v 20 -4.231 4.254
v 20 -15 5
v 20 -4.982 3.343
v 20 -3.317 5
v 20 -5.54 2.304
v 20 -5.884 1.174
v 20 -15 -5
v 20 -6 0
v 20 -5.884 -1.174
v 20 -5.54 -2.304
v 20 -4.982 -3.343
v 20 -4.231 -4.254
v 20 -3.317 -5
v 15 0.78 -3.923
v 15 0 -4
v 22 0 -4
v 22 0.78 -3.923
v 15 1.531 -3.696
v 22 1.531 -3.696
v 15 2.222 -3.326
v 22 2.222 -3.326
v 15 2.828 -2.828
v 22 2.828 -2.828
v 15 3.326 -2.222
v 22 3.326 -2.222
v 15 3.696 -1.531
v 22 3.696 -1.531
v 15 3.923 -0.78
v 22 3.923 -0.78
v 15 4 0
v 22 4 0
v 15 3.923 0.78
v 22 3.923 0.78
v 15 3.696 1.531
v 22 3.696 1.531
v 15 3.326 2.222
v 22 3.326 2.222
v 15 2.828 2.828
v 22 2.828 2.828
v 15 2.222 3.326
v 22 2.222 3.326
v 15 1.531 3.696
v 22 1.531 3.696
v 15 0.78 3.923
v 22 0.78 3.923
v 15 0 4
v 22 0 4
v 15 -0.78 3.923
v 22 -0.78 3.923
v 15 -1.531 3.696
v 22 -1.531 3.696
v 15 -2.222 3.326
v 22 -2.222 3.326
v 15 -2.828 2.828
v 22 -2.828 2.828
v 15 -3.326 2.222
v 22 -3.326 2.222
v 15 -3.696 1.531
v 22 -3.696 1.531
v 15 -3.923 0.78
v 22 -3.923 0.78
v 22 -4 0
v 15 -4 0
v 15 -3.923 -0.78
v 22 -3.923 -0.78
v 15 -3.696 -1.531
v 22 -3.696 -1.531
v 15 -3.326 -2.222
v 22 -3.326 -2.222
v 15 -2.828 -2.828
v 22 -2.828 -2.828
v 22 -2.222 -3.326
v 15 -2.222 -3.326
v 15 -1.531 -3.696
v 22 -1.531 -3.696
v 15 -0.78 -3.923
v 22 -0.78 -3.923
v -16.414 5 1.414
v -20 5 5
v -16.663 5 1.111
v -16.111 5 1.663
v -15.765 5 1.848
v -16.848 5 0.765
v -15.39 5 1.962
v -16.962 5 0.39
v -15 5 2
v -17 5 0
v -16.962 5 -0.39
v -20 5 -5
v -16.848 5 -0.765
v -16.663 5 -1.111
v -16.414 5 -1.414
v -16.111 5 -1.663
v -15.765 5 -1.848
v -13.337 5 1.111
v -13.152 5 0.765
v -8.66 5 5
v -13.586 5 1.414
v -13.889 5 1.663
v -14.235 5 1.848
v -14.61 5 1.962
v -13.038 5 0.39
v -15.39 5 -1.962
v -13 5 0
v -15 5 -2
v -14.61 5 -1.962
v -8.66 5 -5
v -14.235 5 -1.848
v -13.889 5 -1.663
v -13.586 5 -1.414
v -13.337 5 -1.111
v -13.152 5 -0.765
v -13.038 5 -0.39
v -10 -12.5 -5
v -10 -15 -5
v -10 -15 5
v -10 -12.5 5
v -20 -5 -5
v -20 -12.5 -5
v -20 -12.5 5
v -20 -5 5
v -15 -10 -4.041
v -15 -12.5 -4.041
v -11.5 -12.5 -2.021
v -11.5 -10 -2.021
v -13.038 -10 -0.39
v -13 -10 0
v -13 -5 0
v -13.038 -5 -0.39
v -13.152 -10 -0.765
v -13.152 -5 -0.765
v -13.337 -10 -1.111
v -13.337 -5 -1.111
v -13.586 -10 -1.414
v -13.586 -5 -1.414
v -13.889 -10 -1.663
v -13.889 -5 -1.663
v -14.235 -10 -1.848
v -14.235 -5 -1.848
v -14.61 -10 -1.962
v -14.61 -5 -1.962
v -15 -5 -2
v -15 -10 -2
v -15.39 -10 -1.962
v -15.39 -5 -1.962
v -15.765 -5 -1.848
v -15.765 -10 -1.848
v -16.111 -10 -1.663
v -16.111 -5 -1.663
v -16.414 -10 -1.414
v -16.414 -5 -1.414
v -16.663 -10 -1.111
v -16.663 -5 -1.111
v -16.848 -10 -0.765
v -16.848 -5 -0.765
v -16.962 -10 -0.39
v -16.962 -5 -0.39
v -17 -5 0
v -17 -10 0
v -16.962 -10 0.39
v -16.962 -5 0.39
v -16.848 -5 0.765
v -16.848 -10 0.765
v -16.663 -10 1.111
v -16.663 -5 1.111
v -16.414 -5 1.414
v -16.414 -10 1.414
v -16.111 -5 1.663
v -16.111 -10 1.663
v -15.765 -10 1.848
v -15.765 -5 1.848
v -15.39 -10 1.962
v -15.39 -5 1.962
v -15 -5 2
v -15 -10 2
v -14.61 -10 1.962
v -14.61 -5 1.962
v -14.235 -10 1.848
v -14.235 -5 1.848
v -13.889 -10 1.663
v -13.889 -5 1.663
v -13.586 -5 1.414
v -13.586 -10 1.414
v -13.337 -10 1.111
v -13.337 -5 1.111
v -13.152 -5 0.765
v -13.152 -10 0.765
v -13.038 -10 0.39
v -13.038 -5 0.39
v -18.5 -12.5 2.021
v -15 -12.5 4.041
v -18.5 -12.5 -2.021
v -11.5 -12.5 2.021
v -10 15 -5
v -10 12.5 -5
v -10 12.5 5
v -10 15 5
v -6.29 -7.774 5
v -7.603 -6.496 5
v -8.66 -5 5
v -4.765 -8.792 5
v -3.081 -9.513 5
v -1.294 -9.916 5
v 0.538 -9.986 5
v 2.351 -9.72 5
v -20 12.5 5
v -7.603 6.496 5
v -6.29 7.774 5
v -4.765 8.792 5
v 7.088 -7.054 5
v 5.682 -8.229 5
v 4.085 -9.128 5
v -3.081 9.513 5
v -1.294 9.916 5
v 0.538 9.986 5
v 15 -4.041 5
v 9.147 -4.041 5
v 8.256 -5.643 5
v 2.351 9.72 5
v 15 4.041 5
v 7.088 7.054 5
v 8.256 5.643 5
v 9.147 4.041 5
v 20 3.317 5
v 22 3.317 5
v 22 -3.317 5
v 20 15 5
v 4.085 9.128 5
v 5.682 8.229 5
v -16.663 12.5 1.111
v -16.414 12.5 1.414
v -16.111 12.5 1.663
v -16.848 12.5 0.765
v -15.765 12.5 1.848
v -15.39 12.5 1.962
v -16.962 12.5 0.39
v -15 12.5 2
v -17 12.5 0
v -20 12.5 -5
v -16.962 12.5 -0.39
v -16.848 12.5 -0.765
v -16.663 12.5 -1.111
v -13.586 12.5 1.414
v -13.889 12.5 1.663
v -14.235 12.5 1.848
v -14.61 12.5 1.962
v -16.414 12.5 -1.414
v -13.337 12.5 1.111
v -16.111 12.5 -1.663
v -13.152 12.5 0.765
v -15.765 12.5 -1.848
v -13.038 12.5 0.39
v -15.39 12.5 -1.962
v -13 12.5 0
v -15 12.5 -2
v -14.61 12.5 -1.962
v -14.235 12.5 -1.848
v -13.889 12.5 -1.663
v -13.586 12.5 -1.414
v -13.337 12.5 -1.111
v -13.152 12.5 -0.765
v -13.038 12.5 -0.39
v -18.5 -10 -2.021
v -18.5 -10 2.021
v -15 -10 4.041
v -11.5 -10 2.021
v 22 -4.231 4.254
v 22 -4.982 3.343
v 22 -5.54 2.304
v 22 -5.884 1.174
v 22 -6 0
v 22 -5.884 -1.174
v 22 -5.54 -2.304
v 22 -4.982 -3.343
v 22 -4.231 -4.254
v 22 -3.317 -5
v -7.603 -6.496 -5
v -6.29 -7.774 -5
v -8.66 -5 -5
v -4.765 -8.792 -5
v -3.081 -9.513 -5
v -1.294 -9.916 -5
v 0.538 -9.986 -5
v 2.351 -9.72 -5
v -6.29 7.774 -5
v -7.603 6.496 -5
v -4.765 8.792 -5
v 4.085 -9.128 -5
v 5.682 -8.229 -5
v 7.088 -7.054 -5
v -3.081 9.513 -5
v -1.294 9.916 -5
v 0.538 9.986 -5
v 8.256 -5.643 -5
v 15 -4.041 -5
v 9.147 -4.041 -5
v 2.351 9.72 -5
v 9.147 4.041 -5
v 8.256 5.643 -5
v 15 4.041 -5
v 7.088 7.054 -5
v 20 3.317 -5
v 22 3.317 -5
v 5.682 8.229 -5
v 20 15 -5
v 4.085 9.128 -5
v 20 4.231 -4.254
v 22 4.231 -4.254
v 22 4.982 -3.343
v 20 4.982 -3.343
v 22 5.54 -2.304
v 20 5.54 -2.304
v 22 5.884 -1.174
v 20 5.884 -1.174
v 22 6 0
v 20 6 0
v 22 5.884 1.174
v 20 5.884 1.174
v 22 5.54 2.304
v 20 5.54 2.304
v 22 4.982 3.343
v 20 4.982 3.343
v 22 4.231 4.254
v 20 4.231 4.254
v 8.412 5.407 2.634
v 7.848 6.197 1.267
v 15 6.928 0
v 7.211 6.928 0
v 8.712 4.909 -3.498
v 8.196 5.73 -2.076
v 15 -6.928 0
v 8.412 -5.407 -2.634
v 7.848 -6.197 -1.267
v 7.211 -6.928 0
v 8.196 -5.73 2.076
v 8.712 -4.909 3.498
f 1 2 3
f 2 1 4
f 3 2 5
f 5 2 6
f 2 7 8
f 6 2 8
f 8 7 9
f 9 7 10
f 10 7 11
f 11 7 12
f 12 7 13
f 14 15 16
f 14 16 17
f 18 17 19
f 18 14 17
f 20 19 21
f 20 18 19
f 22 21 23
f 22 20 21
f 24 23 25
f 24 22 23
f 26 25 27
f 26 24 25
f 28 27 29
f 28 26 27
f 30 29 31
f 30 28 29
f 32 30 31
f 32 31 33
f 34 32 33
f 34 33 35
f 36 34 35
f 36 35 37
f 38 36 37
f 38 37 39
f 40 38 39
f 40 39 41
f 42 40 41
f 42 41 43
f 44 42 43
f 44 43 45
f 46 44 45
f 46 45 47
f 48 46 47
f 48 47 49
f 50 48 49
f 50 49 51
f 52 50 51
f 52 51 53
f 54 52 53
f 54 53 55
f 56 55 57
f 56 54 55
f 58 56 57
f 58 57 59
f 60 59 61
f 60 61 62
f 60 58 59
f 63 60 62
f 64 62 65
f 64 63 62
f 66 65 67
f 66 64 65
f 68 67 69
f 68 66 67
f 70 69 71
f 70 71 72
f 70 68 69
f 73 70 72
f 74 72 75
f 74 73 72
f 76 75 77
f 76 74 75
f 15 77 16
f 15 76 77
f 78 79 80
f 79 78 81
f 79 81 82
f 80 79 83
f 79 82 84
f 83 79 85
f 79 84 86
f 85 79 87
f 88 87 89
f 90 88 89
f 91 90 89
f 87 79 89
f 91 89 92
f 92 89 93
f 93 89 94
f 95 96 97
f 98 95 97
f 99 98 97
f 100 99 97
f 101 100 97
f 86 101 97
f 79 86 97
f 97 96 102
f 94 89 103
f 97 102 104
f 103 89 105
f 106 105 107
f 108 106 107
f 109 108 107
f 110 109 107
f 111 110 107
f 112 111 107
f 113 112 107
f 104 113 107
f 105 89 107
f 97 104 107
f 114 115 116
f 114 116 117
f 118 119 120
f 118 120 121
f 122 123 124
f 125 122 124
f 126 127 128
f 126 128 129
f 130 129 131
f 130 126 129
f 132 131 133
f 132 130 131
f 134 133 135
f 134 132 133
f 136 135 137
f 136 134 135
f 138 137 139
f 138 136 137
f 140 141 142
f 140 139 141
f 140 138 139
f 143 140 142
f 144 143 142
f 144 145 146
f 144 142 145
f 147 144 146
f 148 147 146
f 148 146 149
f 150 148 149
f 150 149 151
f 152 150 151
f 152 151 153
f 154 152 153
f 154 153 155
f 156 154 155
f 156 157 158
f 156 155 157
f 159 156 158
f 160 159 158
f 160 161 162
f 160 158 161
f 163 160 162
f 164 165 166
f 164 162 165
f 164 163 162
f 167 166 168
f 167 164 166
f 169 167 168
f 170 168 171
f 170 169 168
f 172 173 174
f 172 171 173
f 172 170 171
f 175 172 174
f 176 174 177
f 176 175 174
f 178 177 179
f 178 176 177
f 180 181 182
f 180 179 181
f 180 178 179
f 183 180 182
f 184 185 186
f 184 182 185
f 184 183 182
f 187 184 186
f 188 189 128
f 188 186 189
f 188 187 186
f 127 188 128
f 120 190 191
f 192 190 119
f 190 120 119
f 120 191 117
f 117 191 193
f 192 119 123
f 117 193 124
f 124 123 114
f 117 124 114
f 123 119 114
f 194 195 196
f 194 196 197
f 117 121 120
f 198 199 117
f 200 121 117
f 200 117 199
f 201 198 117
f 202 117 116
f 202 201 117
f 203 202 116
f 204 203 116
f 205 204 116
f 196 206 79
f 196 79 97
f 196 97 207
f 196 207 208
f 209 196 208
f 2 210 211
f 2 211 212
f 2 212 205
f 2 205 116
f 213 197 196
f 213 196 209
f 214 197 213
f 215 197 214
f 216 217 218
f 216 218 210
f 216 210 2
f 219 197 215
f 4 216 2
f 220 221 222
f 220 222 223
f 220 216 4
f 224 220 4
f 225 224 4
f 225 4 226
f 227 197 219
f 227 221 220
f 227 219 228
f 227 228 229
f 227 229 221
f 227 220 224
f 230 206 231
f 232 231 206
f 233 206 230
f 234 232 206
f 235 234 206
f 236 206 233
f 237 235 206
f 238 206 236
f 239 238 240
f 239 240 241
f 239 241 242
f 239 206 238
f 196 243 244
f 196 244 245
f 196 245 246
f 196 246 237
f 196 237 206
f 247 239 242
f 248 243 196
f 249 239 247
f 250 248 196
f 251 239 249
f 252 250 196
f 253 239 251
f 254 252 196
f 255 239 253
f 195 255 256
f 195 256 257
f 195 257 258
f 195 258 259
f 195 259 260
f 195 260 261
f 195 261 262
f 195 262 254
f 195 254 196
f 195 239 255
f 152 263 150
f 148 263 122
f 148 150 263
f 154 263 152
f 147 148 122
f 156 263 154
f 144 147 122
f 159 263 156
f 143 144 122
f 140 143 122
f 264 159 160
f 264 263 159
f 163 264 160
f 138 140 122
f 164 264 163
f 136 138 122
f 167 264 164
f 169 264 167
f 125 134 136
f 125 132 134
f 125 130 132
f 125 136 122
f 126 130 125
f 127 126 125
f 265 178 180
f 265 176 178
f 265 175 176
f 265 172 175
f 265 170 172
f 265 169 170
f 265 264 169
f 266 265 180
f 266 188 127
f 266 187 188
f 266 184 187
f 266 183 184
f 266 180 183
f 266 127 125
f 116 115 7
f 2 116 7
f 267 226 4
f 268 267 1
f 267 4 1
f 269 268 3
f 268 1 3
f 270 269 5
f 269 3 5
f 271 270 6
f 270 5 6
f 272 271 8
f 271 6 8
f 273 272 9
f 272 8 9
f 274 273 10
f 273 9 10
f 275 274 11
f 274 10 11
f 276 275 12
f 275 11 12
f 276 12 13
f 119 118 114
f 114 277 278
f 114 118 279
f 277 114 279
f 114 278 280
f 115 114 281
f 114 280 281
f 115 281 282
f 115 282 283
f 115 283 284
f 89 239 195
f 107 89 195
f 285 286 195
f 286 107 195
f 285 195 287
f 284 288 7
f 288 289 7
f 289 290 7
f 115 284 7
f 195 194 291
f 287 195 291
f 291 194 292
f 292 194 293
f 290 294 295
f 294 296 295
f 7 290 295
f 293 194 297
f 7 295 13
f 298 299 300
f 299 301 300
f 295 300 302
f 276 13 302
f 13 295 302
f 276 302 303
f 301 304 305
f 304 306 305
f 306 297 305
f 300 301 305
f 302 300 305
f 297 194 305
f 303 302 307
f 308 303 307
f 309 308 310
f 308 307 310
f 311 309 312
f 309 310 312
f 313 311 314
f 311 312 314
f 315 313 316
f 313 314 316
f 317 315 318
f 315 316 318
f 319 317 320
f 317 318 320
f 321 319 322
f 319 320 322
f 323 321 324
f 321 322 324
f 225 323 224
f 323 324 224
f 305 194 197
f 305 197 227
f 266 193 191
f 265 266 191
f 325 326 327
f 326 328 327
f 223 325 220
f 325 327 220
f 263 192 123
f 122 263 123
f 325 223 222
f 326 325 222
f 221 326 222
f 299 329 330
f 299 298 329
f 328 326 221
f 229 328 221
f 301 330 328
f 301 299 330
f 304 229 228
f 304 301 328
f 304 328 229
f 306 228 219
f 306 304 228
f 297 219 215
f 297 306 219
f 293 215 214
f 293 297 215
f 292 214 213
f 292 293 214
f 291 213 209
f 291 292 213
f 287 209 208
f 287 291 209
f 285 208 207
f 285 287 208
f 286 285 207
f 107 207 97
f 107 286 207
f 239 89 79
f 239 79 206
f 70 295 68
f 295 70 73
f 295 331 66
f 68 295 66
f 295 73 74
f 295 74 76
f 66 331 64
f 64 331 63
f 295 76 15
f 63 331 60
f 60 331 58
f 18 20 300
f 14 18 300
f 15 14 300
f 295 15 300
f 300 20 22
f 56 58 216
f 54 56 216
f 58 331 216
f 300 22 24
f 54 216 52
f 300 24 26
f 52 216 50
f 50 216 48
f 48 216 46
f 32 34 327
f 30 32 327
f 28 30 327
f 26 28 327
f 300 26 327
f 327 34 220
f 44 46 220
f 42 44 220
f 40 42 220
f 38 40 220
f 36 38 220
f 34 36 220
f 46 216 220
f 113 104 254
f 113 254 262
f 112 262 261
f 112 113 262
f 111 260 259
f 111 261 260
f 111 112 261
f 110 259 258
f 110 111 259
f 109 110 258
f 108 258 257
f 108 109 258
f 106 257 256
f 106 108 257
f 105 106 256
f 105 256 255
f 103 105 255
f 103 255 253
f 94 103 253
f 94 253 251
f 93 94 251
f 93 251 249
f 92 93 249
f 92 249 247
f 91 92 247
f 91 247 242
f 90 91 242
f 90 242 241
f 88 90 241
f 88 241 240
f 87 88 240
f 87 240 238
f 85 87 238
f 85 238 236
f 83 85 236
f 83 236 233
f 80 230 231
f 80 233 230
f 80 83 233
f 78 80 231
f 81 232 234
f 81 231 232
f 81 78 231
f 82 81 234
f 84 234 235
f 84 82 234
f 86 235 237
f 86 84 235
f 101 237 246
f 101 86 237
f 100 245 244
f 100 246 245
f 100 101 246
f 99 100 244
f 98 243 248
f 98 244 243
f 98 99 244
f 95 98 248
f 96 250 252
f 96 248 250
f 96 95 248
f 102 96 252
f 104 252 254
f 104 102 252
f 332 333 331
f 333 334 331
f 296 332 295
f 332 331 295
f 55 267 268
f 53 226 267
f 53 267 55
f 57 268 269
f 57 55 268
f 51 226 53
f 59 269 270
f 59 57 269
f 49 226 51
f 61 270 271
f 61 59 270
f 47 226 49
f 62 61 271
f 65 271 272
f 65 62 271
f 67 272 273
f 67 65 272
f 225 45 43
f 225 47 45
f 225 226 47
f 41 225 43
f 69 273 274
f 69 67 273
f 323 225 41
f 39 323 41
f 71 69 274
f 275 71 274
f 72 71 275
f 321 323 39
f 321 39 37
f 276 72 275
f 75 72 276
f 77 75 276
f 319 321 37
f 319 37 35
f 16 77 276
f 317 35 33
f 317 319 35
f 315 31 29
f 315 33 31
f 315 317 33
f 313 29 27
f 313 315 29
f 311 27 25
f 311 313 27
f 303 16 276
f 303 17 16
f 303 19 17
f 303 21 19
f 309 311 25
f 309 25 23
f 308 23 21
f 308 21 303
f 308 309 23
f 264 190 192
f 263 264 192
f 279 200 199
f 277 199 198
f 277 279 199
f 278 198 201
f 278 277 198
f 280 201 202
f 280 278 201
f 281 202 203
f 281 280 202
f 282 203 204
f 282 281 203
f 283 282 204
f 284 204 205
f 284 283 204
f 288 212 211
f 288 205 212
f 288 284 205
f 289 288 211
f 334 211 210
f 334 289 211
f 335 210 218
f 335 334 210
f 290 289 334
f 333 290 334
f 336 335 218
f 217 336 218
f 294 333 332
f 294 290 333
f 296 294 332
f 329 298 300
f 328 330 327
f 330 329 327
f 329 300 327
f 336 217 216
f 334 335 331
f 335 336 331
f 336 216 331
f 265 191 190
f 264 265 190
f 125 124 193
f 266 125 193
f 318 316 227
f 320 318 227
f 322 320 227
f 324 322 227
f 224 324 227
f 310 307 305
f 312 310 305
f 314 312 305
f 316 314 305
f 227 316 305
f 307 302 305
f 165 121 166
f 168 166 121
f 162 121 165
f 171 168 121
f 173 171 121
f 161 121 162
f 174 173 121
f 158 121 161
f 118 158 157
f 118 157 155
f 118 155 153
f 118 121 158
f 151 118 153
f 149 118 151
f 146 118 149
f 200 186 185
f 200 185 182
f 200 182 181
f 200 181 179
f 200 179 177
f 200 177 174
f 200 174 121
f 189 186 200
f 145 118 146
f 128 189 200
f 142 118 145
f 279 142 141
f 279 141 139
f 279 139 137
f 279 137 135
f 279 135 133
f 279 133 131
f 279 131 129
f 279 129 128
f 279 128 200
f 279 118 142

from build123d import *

# Parameters (mm, degrees)
CYLINDER_R              = 10
CYLINDER_DEPTH          = 10
CYLINDER001_R           = 2
CYLINDER001_DEPTH       = 30
CYLINDER001_ROLL_ANGLE  = -90
PAD001_DEPTH            = 10
CYLINDER002_R           = 4
CYLINDER002_DEPTH       = 12
CYLINDER002_PITCH_ANGLE = 90
BOX002_W                = 10
BOX002_H                = 2.5
BOX002_DEPTH            = 10
BOX003_W                = 10
BOX003_H                = 2.5
BOX003_DEPTH            = 10
PAD_DEPTH               = 2.5
BOX004_W                = 10
BOX004_H                = 10
BOX004_DEPTH            = 5
BOX005_W                = 10
BOX005_H                = 10
BOX005_DEPTH            = 5
BOX001_W                = 15
BOX001_H                = 10
BOX001_DEPTH            = 10
CYLINDER003_R           = 6
CYLINDER003_DEPTH       = 2
CYLINDER003_PITCH_ANGLE = 90
BOX_W                   = 40
BOX_H                   = 30
BOX_DEPTH               = 10


with BuildPart() as cylinder:
    # Cylinder → Cylinder (new body)
    with BuildSketch(Plane.XY.offset(-5)):
        Circle(CYLINDER_R)
    extrude(amount=CYLINDER_DEPTH)


with BuildPart() as cylinder001:
    # Cylinder001 → Cylinder001 (new body)
    with BuildSketch(Plane.XY):
        Circle(CYLINDER001_R)
    extrude(amount=CYLINDER001_DEPTH)


with BuildPart() as cylinder001_1:
    # Cylinder001 roll: moved
    add(cylinder001.part.rotate(Axis((0, 0, 0), (1, 0, 0)), CYLINDER001_ROLL_ANGLE))


with BuildPart() as cylinder001_2:
    # Cylinder001 placement: moved
    add(cylinder001_1.part.moved(Location((-15, -15, 0))))


with BuildPart() as other_nut:
    # Sketch001 → Pad001 (new body)
    with BuildSketch(Plane.YZ):
        Polygon((3.464102, 6), (-3.464102, 6), (-6.928203, 0), (-3.464102, -6), (3.464102, -6), (6.928203, 0), align=None)
    extrude(amount=-PAD001_DEPTH)


with BuildPart() as other_nut_1:
    # Body001 placement: moved
    add(other_nut.part.moved(Location((15, 0, 0))))


with BuildPart() as other_screw:
    # Cylinder002 → Cylinder002 (new body)
    with BuildSketch(Plane.XY):
        Circle(CYLINDER002_R)
    extrude(amount=CYLINDER002_DEPTH)


with BuildPart() as other_screw_1:
    # Cylinder002 pitch: moved
    add(other_screw.part.rotate(Axis((0, 0, 0), (0, 1, 0)), CYLINDER002_PITCH_ANGLE))


with BuildPart() as other_screw_2:
    # Cylinder002 placement: moved
    add(other_screw_1.part.moved(Location((10, 0, 0))))


with BuildPart() as cube002:
    # Box002 → Box002 (new body)
    with BuildSketch(Plane(origin=(-20, 12.5, -5), x_dir=(1, 0, 0), z_dir=(0, 0, 1))):
        with Locations((5, 1.25)):
            Rectangle(BOX002_W, BOX002_H)
    extrude(amount=BOX002_DEPTH)


with BuildPart() as cube003:
    # Box003 → Box003 (new body)
    with BuildSketch(Plane(origin=(-20, -15, -5), x_dir=(1, 0, 0), z_dir=(0, 0, 1))):
        with Locations((5, 1.25)):
            Rectangle(BOX003_W, BOX003_H)
    extrude(amount=BOX003_DEPTH)


with BuildPart() as body:
    # Sketch → Pad (new body)
    with BuildSketch(Plane.XZ):
        Polygon((0, -4.041452), (3.5, -2.020726), (3.5, 2.020726), (0, 4.041452), (-3.5, 2.020726), (-3.5, -2.020726), align=None)
    extrude(amount=-PAD_DEPTH)


with BuildPart() as body_1:
    # Body placement: moved
    add(body.part.moved(Location((-15, -12.5, 0))))


with BuildPart() as cube004:
    # Box004 → Box004 (new body)
    with BuildSketch(Plane(origin=(15, -5, -10), x_dir=(1, 0, 0), z_dir=(0, 0, 1))):
        with Locations((5, 5)):
            Rectangle(BOX004_W, BOX004_H)
    extrude(amount=BOX004_DEPTH)


with BuildPart() as cube005:
    # Box005 → Box005 (new body)
    with BuildSketch(Plane(origin=(15, -5, 5), x_dir=(1, 0, 0), z_dir=(0, 0, 1))):
        with Locations((5, 5)):
            Rectangle(BOX005_W, BOX005_H)
    extrude(amount=BOX005_DEPTH)


with BuildPart() as negative_fusion:
    # Box001 → Box001 (new body)
    with BuildSketch(Plane(origin=(-20, -5, -5), x_dir=(1, 0, 0), z_dir=(0, 0, 1))):
        with Locations((7.5, 5)):
            Rectangle(BOX001_W, BOX001_H)
    extrude(amount=BOX001_DEPTH)

    # Fusion: union Cylinder, Cylinder001, Other Nut, Other Screw, Cube002, Cube003, Body, Cube004, Cube005
    add(cylinder.part)
    add(cylinder001_2.part)
    add(other_nut_1.part)
    add(other_screw_2.part)
    add(cube002.part)
    add(cube003.part)
    add(body_1.part)
    add(cube004.part)
    add(cube005.part)


with BuildPart() as cylinder002:
    # Cylinder003 → Cylinder003 (new body)
    with BuildSketch(Plane.XY):
        Circle(CYLINDER003_R)
    extrude(amount=CYLINDER003_DEPTH)


with BuildPart() as cylinder002_1:
    # Cylinder003 pitch: moved
    add(cylinder002.part.rotate(Axis((0, 0, 0), (0, 1, 0)), CYLINDER003_PITCH_ANGLE))


with BuildPart() as cylinder002_2:
    # Cylinder003 placement: moved
    add(cylinder002_1.part.moved(Location((20, 0, 0))))


with BuildPart() as cut:
    # Box → Box (new body)
    with BuildSketch(Plane(origin=(-20, -15, -5), x_dir=(1, 0, 0), z_dir=(0, 0, 1))):
        with Locations((20, 15)):
            Rectangle(BOX_W, BOX_H)
    extrude(amount=BOX_DEPTH)

    # Fusion001: union Cylinder002
    add(cylinder002_2.part)

    # Cut: cut Negative Fusion
    add(negative_fusion.part, mode=Mode.SUBTRACT)


solid = cut.part
